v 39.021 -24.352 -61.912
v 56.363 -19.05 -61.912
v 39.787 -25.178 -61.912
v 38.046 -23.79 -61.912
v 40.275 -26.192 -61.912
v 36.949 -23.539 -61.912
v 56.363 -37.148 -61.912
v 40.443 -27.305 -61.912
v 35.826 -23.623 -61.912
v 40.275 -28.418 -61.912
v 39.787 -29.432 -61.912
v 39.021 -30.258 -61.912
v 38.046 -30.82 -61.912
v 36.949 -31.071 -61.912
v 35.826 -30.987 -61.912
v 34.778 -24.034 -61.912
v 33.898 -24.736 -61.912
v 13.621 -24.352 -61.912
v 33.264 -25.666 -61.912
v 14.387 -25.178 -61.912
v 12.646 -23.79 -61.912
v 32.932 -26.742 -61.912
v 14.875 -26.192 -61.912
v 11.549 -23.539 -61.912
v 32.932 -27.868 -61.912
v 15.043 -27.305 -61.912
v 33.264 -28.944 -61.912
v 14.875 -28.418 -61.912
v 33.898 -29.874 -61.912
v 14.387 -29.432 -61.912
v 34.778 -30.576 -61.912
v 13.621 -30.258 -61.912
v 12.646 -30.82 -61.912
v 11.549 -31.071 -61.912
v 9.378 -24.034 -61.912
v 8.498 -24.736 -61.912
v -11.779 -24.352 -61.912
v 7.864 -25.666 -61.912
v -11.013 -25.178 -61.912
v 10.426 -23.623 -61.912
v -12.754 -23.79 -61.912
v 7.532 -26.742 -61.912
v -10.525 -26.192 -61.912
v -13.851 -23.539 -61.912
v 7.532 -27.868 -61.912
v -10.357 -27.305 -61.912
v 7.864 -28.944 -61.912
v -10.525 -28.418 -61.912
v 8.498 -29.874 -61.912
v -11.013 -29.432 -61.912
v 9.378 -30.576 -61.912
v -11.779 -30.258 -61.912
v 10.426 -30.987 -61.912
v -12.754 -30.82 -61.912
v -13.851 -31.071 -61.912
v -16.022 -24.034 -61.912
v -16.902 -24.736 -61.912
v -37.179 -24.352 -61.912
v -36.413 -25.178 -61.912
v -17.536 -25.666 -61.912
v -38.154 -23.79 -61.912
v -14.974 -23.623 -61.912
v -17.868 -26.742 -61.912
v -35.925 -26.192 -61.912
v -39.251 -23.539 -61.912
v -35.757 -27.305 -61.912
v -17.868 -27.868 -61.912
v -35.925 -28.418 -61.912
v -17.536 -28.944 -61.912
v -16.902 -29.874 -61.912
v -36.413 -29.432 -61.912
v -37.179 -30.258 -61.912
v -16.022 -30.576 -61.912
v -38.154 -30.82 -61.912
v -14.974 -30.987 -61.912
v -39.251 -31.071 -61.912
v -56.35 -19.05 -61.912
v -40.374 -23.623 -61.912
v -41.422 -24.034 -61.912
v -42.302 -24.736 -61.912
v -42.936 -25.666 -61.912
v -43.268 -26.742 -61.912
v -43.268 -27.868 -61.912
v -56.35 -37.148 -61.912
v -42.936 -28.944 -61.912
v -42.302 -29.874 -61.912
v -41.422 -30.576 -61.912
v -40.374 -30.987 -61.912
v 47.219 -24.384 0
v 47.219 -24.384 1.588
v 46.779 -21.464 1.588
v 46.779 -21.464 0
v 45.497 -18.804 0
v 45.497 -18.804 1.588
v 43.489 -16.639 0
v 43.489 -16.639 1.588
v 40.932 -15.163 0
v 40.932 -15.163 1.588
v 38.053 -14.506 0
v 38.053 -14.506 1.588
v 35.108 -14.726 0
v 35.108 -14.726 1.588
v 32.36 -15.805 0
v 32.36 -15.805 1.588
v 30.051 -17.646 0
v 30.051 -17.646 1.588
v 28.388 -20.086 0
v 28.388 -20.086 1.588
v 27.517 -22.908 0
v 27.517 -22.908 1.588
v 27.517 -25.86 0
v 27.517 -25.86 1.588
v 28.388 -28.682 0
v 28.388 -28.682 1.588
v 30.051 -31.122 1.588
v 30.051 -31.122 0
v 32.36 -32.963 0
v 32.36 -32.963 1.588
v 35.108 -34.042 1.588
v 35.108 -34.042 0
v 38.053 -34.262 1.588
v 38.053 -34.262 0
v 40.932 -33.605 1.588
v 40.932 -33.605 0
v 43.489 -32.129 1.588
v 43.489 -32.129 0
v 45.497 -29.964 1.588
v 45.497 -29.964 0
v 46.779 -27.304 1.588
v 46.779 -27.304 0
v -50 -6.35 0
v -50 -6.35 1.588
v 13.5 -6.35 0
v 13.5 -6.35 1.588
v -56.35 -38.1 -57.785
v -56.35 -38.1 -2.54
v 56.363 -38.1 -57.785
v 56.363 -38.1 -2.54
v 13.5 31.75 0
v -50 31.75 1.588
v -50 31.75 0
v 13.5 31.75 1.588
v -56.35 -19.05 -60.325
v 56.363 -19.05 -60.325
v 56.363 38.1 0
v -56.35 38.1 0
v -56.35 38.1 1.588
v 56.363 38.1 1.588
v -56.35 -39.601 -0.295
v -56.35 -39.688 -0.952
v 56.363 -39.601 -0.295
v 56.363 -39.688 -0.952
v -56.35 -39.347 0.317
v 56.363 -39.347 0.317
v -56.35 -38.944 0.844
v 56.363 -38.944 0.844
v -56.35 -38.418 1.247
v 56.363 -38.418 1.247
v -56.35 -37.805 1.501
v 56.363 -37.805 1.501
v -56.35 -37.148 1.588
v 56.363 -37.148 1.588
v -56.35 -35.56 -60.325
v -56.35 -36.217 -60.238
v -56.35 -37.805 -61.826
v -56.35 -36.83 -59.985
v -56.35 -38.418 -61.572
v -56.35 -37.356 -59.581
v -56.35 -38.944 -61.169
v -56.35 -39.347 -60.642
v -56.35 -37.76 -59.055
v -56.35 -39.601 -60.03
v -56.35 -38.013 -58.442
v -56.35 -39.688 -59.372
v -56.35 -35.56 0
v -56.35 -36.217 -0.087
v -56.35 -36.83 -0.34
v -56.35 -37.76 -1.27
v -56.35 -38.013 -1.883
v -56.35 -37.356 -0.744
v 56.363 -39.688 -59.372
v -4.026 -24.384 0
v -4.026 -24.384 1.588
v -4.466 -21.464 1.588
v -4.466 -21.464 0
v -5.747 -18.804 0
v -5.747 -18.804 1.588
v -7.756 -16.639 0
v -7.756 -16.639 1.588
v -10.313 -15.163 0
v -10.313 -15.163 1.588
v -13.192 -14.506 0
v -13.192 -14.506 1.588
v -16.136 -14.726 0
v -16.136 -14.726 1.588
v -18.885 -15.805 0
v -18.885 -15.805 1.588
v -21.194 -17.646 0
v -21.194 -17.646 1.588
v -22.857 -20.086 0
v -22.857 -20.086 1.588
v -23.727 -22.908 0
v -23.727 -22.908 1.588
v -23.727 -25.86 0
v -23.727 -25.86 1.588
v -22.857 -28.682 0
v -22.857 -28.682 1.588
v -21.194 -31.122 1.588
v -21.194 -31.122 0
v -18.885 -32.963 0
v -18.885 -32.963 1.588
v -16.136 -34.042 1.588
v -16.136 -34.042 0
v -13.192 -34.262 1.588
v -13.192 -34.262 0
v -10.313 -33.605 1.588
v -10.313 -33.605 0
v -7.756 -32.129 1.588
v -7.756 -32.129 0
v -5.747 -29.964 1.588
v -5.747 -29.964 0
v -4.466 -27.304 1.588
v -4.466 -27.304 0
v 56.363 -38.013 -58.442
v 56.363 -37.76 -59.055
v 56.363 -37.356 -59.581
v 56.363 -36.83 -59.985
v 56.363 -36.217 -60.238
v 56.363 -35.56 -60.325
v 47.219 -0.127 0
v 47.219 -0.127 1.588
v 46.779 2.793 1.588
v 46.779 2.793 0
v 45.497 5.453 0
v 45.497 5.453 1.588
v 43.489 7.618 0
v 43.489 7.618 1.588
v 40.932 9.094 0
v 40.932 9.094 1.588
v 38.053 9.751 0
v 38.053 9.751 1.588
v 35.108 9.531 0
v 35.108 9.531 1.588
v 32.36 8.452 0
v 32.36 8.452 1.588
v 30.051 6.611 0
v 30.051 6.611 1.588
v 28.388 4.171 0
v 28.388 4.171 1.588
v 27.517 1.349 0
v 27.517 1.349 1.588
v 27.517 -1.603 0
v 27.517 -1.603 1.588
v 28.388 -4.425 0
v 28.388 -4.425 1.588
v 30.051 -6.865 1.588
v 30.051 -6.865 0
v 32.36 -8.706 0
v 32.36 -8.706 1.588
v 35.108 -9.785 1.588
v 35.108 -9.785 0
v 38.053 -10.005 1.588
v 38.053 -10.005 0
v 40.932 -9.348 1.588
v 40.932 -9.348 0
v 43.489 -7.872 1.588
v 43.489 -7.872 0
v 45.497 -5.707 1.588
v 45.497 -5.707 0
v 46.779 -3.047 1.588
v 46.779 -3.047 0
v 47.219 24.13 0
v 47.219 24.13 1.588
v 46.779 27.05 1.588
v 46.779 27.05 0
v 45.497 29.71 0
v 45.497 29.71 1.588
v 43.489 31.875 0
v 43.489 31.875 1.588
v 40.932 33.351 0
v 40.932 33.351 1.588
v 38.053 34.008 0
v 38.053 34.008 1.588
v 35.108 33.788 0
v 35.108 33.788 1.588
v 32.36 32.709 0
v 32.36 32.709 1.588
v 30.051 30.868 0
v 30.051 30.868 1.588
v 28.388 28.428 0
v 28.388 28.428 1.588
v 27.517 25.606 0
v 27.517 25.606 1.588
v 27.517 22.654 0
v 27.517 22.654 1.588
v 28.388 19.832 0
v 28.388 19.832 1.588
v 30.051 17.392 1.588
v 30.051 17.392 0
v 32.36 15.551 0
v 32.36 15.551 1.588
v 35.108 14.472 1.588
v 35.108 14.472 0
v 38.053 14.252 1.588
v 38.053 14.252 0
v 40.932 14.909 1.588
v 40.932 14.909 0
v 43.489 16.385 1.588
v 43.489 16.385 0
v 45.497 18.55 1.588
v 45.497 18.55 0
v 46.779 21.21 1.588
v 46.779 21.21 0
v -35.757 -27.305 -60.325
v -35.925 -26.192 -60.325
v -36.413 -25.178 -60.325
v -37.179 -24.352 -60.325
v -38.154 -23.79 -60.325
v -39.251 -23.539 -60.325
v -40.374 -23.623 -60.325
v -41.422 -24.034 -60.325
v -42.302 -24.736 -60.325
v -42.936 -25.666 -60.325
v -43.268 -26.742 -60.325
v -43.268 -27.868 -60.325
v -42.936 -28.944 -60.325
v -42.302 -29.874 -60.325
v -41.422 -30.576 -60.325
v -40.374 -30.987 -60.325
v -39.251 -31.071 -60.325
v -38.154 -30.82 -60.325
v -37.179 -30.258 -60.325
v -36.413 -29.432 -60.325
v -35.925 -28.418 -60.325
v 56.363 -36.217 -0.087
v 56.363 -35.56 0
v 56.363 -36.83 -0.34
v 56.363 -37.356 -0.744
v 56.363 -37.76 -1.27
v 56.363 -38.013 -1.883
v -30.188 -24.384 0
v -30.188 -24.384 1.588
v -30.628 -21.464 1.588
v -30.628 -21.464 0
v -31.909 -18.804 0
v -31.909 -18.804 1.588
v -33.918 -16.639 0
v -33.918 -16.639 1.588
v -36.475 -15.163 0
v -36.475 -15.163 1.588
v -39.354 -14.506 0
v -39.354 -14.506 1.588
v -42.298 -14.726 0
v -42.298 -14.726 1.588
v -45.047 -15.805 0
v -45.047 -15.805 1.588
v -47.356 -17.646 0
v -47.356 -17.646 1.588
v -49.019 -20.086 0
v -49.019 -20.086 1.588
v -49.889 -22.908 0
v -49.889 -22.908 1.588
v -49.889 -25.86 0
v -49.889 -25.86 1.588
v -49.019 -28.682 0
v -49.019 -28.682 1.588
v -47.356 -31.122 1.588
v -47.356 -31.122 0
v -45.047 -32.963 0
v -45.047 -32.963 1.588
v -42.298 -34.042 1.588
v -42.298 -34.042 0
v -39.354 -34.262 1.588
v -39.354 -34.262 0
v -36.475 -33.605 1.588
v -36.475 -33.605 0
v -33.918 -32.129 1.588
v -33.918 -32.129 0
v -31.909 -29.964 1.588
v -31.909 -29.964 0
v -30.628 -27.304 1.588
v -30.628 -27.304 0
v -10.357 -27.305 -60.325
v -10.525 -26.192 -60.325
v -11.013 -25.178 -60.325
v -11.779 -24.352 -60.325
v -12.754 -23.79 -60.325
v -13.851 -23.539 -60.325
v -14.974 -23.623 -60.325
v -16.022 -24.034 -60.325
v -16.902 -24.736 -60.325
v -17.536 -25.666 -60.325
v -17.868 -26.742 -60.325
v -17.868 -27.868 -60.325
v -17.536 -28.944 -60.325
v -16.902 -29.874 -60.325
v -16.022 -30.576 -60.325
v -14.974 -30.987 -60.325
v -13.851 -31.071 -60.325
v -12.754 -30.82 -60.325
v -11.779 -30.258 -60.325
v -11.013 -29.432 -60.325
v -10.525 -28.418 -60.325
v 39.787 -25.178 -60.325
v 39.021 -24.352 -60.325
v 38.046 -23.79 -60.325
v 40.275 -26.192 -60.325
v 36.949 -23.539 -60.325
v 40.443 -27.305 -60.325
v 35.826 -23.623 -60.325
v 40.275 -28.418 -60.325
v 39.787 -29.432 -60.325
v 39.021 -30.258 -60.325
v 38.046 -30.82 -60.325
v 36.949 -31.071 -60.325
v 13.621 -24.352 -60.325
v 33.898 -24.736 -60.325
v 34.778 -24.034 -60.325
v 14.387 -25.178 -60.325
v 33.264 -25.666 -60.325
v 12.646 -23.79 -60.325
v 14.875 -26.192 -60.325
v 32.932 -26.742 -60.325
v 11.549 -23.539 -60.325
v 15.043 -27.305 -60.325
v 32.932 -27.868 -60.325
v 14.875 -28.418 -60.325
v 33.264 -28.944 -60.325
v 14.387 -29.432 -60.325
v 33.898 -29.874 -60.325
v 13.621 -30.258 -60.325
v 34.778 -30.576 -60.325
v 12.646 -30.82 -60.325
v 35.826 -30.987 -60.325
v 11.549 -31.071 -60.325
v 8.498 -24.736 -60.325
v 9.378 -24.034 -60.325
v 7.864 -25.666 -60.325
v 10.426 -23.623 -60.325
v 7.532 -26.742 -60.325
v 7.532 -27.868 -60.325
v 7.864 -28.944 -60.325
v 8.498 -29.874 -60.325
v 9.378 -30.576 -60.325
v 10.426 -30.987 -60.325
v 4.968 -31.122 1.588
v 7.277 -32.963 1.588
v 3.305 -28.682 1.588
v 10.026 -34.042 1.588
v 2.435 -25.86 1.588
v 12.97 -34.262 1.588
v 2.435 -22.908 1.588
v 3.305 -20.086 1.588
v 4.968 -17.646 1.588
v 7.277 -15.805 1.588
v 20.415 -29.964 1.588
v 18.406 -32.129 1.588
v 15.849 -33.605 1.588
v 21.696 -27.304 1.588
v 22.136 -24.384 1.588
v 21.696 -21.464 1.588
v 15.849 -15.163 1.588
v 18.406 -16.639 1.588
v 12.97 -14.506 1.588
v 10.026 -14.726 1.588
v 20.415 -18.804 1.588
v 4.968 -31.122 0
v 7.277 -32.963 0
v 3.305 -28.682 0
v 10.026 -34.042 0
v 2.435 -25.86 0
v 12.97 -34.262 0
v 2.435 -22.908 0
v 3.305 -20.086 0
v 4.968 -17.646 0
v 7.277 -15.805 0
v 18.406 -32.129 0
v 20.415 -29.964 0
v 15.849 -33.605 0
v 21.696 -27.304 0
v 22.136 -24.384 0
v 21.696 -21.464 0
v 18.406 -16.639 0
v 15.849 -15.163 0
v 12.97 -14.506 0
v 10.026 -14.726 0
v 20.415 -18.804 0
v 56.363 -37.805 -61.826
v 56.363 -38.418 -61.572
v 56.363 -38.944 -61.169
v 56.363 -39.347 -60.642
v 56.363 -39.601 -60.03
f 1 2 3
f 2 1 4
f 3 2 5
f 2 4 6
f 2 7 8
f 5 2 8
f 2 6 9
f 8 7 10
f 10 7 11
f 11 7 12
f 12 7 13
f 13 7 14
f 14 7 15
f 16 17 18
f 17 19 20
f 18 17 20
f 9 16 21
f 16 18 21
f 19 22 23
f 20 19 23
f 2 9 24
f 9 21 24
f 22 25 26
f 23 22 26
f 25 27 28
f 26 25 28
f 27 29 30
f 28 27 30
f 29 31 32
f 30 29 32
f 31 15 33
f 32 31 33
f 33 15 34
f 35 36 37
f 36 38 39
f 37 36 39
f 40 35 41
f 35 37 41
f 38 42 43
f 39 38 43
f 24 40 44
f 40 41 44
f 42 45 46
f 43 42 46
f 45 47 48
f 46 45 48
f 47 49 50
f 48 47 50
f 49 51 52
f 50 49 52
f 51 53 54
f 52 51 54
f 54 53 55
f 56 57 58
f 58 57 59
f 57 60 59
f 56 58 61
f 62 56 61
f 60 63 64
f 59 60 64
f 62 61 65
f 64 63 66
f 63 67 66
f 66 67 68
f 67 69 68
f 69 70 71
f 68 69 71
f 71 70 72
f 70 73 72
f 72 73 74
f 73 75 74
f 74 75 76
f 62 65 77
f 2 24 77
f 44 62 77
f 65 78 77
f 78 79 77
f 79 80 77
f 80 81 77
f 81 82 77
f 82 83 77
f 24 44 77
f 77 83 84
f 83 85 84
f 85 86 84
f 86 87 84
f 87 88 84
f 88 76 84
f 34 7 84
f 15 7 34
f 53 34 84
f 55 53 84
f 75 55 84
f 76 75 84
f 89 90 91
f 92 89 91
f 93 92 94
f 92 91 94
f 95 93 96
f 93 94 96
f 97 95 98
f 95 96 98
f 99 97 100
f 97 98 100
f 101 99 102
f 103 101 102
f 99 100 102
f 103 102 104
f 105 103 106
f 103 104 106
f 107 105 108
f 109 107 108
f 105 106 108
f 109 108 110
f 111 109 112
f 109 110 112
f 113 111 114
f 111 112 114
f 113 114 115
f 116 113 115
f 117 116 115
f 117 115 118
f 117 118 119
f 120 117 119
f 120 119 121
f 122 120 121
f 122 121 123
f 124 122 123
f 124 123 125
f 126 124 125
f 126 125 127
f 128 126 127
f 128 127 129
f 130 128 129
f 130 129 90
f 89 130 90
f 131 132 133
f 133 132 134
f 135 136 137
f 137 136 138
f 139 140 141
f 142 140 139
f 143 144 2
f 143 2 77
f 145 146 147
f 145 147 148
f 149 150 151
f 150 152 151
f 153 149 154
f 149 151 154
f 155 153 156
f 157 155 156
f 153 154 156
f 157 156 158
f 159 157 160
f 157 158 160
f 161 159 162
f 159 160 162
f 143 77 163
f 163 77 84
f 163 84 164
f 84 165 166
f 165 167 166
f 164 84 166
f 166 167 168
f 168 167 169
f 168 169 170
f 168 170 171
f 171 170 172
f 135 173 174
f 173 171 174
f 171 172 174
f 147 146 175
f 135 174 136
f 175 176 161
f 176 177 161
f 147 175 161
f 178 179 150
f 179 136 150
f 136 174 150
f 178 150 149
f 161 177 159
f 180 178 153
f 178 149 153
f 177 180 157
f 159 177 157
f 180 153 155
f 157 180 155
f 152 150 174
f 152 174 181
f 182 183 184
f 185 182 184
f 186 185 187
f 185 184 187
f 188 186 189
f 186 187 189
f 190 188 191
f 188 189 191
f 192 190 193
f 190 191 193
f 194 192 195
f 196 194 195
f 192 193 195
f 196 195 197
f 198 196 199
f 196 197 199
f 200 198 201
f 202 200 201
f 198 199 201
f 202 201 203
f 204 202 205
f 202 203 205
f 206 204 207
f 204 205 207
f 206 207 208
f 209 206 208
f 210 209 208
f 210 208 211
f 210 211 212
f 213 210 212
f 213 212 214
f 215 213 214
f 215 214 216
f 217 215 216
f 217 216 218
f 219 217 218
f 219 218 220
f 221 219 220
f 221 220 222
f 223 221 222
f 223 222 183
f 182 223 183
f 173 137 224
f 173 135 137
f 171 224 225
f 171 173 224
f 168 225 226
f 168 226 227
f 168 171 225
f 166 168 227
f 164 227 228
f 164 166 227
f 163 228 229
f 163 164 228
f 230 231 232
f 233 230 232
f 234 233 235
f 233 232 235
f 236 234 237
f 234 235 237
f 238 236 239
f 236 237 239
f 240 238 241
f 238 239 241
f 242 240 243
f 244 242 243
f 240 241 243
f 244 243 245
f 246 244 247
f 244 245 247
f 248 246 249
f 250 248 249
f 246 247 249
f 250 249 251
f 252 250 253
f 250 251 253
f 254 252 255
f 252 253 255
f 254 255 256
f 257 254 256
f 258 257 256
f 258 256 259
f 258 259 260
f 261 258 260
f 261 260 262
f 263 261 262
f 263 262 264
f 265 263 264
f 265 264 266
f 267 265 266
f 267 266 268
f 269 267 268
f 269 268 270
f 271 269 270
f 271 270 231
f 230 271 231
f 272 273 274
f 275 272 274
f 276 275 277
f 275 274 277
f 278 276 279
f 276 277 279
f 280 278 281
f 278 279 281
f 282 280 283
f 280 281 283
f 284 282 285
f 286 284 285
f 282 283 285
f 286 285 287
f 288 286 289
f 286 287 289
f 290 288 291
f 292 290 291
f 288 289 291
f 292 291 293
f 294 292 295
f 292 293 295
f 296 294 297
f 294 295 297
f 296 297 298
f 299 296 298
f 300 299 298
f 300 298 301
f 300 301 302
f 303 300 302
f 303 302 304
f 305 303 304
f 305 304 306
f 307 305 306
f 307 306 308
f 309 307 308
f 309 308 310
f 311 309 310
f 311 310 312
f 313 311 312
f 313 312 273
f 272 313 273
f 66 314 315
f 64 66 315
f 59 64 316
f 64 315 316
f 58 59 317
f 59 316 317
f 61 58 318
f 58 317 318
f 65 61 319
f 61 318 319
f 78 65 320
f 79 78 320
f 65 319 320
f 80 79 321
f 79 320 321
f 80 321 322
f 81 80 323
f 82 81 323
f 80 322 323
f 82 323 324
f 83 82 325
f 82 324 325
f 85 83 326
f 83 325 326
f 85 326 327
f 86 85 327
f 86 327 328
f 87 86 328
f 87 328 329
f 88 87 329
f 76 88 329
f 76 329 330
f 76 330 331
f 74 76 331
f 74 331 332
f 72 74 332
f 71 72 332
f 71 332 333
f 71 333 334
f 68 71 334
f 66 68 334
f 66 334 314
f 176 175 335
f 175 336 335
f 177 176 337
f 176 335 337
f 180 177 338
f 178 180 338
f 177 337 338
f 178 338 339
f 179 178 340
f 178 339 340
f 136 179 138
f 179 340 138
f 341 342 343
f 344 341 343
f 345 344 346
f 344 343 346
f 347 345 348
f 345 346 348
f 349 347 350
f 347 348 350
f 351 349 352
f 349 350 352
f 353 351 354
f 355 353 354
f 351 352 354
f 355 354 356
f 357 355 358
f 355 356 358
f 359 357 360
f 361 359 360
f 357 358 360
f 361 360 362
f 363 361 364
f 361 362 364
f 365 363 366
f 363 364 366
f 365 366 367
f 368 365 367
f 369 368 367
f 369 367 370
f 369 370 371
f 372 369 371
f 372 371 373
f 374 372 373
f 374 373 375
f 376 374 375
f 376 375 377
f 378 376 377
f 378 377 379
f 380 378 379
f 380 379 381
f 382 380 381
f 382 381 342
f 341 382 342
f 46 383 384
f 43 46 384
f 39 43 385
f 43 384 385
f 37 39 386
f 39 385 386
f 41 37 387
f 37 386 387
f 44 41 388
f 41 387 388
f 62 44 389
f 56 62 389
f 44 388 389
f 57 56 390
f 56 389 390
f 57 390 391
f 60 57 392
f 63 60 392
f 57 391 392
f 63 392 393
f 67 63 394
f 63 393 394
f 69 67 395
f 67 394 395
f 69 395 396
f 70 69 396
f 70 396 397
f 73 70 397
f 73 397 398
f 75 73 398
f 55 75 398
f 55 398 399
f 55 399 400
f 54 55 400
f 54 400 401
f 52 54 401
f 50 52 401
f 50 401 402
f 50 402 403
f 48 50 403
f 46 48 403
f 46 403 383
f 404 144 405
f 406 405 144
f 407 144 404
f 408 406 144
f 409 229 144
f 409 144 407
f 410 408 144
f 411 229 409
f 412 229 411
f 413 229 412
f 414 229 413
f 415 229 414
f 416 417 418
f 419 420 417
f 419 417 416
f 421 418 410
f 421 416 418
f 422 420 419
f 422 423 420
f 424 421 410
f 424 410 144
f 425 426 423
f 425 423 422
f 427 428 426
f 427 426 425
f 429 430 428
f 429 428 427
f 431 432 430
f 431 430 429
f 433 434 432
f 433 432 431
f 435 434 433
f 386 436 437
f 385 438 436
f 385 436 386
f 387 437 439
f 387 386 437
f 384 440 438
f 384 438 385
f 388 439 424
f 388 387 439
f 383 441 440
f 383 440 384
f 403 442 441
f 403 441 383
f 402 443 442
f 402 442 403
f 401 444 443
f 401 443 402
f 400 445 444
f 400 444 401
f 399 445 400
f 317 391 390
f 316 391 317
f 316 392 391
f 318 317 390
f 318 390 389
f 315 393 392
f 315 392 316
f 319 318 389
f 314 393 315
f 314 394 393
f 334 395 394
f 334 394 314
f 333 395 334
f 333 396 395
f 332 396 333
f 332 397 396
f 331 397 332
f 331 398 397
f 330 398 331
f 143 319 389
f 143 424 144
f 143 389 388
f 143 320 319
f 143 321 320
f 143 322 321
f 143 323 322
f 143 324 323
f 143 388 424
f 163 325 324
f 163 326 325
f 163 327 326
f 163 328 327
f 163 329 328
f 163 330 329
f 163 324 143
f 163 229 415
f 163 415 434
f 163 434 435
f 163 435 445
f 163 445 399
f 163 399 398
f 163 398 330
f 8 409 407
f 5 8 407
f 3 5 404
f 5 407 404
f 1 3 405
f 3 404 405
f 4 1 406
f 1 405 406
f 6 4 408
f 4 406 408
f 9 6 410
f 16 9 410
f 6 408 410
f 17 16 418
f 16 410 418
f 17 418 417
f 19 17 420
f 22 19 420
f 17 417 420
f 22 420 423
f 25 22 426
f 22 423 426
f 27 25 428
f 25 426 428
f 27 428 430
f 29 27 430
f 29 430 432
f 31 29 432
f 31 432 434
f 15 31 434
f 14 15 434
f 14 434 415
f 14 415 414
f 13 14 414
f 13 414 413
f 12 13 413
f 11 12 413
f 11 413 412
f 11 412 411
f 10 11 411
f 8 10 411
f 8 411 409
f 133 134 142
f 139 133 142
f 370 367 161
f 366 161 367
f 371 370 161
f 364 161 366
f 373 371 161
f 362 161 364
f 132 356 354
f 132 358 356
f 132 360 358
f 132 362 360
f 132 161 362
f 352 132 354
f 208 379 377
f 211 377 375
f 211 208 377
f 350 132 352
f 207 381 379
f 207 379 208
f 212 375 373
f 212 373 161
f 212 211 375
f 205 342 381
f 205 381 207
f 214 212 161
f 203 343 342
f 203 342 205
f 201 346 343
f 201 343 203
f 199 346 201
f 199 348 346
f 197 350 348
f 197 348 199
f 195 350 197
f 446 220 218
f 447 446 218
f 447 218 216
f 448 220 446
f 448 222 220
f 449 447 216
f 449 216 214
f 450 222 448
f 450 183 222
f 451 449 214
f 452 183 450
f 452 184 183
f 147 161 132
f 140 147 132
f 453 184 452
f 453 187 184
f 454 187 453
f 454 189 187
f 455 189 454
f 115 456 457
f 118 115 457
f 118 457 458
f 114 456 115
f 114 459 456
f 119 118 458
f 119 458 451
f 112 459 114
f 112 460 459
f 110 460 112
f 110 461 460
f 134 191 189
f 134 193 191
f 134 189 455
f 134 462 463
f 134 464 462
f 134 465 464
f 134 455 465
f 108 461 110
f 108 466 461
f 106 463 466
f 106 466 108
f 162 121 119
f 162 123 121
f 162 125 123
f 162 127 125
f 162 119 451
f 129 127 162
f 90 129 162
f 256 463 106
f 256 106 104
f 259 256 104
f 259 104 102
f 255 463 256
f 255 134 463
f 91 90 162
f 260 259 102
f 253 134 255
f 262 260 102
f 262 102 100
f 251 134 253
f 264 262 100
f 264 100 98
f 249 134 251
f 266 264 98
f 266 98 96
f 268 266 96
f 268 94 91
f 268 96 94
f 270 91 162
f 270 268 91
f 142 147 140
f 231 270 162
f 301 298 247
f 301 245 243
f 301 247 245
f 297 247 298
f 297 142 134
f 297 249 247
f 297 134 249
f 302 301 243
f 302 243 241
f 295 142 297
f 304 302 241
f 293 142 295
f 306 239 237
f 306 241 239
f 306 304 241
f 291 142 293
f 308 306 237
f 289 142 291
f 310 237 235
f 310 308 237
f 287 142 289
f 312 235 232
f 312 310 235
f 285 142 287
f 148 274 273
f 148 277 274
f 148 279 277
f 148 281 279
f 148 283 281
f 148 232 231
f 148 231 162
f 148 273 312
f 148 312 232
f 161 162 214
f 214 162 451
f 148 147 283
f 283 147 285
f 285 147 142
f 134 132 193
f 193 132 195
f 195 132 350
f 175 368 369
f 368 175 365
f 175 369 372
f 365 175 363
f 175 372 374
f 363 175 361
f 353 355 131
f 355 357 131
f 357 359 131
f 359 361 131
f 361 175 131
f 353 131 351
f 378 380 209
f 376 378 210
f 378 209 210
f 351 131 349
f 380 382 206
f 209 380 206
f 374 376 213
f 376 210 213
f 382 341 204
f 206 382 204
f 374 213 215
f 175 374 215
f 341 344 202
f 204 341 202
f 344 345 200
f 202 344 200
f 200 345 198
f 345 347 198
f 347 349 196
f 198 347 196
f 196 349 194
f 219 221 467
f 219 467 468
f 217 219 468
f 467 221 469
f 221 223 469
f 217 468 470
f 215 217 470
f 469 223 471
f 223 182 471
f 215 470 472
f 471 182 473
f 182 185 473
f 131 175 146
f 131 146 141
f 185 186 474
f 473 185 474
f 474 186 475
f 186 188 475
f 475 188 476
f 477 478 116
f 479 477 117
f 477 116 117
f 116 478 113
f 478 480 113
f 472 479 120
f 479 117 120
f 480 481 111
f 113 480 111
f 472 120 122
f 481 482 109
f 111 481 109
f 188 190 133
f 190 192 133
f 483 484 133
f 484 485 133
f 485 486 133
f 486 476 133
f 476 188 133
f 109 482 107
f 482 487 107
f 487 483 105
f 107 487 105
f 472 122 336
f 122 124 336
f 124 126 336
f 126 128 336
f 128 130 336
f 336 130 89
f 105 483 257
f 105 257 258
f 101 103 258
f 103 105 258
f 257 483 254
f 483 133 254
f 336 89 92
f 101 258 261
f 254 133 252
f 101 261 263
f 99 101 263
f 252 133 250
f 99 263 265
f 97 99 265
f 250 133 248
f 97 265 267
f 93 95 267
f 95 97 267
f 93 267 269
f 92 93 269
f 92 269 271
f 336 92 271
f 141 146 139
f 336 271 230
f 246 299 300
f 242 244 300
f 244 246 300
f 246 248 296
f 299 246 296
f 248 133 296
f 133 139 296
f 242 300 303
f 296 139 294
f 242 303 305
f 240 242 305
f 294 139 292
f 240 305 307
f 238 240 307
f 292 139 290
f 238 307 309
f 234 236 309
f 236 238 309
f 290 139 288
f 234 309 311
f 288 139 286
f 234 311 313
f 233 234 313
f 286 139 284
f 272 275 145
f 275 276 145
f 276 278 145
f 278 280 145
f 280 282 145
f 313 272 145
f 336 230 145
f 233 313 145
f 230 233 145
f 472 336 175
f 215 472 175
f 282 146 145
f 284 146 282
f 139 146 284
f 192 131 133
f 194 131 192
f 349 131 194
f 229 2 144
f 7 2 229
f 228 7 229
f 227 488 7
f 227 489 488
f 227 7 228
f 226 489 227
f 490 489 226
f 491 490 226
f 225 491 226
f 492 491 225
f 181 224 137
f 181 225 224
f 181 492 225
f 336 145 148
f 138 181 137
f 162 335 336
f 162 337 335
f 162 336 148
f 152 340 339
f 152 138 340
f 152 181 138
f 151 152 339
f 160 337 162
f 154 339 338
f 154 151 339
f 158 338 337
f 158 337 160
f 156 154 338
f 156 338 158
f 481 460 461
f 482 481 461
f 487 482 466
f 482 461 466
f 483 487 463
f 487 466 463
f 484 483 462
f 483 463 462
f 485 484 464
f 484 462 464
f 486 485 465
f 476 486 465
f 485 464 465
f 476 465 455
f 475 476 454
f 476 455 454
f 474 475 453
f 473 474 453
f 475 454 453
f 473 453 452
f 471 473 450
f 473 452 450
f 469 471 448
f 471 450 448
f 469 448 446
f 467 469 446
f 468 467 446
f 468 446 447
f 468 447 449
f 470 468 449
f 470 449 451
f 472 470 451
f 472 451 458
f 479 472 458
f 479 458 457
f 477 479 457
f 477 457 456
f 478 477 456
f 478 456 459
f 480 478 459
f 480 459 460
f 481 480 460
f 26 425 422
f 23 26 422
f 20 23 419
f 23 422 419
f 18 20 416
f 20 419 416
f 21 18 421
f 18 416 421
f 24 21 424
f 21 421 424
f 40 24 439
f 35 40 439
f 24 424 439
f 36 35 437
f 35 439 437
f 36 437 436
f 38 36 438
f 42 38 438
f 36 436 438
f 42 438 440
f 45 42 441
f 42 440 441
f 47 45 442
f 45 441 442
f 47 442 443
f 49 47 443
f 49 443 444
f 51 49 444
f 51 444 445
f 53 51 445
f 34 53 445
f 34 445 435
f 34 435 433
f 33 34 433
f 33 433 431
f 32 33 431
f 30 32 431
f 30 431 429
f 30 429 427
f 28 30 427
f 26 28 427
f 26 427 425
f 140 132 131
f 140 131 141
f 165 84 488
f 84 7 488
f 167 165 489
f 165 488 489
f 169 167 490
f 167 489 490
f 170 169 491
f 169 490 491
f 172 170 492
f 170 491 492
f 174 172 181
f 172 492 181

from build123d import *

# Parameters (mm, degrees)
F0_W      = 112.7125
F0_H      = 76.2
F1_DEPTH  = 1.5875
F2_W      = 63.5
F2_H      = 38.1
F2_R      = 9.906
F3_DEPTH  = 1.5885
F4_W      = 112.7125
F4_H      = 1.5875
F5_DEPTH  = 63.5
F6_W      = 112.7125
F6_H      = 1.5875
F7_DEPTH  = 19.05
F8_R      = 2.54
F9_R      = 3.776515
F10_DEPTH = 1.5885


with BuildPart() as f1:
    # F0 (on Top) → F1 (new body)
    with BuildSketch(Plane.XY):
        with Locations((0.00635, 0)):
            Rectangle(F0_W, F0_H)
    extrude(amount=F1_DEPTH)

    # F2 (on face) → F3 (cut, through all)
    with BuildSketch(Plane.XY.offset(1.5875)):
        with Locations((-18.2499, 12.7)):
            Rectangle(F2_W, F2_H)
        with Locations((37.3126, 24.13)):
            Circle(F2_R)
        with Locations((37.3126, -0.127)):
            Circle(F2_R)
        with Locations((37.3126, -24.384)):
            Circle(F2_R)
        with Locations((-40.0939, -24.384)):
            Circle(F2_R)
        with Locations((-13.9319, -24.384)):
            Circle(F2_R)
        with Locations((12.2301, -24.384)):
            Circle(F2_R)
    extrude(amount=-F3_DEPTH, mode=Mode.SUBTRACT)

    # F4 (on face) → F5 (join)
    with BuildSketch(Plane.XY.offset(1.5875)):
        with Locations((0.00635, -38.89375)):
            Rectangle(F4_W, F4_H)
    extrude(amount=-F5_DEPTH)

    # F6 (on face) → F7 (join)
    with BuildSketch(Plane(origin=(0, -38.1, 0), x_dir=(-1, 0, 0), z_dir=(0, 1, 0))):
        with Locations((-0.00635, -61.11875)):
            Rectangle(F6_W, F6_H)
    extrude(amount=F7_DEPTH)

    # F8
    f8_edges = [f1.edges().sort_by_distance(p)[0] for p in [
        (0.00635, -39.6875, 1.5875),
        (0.00635, -38.1, 0),
        (0.00635, -39.6875, -61.9125),
        (0.00635, -38.1, -60.325),
    ]]
    fillet(f8_edges, radius=F8_R)

    # F9 (on face) → F10 (cut, through all)
    with BuildSketch(Plane.XY.offset(-60.325)):
        with Locations((-39.533325, -27.305)):
            Circle(F9_R)
        with Locations((-14.133325, -27.305)):
            Circle(F9_R)
        with Locations((11.266675, -27.305)):
            Circle(F9_R)
        with Locations((36.666675, -27.305)):
            Circle(F9_R)
    extrude(amount=-F10_DEPTH, mode=Mode.SUBTRACT)


solid = f1.part
